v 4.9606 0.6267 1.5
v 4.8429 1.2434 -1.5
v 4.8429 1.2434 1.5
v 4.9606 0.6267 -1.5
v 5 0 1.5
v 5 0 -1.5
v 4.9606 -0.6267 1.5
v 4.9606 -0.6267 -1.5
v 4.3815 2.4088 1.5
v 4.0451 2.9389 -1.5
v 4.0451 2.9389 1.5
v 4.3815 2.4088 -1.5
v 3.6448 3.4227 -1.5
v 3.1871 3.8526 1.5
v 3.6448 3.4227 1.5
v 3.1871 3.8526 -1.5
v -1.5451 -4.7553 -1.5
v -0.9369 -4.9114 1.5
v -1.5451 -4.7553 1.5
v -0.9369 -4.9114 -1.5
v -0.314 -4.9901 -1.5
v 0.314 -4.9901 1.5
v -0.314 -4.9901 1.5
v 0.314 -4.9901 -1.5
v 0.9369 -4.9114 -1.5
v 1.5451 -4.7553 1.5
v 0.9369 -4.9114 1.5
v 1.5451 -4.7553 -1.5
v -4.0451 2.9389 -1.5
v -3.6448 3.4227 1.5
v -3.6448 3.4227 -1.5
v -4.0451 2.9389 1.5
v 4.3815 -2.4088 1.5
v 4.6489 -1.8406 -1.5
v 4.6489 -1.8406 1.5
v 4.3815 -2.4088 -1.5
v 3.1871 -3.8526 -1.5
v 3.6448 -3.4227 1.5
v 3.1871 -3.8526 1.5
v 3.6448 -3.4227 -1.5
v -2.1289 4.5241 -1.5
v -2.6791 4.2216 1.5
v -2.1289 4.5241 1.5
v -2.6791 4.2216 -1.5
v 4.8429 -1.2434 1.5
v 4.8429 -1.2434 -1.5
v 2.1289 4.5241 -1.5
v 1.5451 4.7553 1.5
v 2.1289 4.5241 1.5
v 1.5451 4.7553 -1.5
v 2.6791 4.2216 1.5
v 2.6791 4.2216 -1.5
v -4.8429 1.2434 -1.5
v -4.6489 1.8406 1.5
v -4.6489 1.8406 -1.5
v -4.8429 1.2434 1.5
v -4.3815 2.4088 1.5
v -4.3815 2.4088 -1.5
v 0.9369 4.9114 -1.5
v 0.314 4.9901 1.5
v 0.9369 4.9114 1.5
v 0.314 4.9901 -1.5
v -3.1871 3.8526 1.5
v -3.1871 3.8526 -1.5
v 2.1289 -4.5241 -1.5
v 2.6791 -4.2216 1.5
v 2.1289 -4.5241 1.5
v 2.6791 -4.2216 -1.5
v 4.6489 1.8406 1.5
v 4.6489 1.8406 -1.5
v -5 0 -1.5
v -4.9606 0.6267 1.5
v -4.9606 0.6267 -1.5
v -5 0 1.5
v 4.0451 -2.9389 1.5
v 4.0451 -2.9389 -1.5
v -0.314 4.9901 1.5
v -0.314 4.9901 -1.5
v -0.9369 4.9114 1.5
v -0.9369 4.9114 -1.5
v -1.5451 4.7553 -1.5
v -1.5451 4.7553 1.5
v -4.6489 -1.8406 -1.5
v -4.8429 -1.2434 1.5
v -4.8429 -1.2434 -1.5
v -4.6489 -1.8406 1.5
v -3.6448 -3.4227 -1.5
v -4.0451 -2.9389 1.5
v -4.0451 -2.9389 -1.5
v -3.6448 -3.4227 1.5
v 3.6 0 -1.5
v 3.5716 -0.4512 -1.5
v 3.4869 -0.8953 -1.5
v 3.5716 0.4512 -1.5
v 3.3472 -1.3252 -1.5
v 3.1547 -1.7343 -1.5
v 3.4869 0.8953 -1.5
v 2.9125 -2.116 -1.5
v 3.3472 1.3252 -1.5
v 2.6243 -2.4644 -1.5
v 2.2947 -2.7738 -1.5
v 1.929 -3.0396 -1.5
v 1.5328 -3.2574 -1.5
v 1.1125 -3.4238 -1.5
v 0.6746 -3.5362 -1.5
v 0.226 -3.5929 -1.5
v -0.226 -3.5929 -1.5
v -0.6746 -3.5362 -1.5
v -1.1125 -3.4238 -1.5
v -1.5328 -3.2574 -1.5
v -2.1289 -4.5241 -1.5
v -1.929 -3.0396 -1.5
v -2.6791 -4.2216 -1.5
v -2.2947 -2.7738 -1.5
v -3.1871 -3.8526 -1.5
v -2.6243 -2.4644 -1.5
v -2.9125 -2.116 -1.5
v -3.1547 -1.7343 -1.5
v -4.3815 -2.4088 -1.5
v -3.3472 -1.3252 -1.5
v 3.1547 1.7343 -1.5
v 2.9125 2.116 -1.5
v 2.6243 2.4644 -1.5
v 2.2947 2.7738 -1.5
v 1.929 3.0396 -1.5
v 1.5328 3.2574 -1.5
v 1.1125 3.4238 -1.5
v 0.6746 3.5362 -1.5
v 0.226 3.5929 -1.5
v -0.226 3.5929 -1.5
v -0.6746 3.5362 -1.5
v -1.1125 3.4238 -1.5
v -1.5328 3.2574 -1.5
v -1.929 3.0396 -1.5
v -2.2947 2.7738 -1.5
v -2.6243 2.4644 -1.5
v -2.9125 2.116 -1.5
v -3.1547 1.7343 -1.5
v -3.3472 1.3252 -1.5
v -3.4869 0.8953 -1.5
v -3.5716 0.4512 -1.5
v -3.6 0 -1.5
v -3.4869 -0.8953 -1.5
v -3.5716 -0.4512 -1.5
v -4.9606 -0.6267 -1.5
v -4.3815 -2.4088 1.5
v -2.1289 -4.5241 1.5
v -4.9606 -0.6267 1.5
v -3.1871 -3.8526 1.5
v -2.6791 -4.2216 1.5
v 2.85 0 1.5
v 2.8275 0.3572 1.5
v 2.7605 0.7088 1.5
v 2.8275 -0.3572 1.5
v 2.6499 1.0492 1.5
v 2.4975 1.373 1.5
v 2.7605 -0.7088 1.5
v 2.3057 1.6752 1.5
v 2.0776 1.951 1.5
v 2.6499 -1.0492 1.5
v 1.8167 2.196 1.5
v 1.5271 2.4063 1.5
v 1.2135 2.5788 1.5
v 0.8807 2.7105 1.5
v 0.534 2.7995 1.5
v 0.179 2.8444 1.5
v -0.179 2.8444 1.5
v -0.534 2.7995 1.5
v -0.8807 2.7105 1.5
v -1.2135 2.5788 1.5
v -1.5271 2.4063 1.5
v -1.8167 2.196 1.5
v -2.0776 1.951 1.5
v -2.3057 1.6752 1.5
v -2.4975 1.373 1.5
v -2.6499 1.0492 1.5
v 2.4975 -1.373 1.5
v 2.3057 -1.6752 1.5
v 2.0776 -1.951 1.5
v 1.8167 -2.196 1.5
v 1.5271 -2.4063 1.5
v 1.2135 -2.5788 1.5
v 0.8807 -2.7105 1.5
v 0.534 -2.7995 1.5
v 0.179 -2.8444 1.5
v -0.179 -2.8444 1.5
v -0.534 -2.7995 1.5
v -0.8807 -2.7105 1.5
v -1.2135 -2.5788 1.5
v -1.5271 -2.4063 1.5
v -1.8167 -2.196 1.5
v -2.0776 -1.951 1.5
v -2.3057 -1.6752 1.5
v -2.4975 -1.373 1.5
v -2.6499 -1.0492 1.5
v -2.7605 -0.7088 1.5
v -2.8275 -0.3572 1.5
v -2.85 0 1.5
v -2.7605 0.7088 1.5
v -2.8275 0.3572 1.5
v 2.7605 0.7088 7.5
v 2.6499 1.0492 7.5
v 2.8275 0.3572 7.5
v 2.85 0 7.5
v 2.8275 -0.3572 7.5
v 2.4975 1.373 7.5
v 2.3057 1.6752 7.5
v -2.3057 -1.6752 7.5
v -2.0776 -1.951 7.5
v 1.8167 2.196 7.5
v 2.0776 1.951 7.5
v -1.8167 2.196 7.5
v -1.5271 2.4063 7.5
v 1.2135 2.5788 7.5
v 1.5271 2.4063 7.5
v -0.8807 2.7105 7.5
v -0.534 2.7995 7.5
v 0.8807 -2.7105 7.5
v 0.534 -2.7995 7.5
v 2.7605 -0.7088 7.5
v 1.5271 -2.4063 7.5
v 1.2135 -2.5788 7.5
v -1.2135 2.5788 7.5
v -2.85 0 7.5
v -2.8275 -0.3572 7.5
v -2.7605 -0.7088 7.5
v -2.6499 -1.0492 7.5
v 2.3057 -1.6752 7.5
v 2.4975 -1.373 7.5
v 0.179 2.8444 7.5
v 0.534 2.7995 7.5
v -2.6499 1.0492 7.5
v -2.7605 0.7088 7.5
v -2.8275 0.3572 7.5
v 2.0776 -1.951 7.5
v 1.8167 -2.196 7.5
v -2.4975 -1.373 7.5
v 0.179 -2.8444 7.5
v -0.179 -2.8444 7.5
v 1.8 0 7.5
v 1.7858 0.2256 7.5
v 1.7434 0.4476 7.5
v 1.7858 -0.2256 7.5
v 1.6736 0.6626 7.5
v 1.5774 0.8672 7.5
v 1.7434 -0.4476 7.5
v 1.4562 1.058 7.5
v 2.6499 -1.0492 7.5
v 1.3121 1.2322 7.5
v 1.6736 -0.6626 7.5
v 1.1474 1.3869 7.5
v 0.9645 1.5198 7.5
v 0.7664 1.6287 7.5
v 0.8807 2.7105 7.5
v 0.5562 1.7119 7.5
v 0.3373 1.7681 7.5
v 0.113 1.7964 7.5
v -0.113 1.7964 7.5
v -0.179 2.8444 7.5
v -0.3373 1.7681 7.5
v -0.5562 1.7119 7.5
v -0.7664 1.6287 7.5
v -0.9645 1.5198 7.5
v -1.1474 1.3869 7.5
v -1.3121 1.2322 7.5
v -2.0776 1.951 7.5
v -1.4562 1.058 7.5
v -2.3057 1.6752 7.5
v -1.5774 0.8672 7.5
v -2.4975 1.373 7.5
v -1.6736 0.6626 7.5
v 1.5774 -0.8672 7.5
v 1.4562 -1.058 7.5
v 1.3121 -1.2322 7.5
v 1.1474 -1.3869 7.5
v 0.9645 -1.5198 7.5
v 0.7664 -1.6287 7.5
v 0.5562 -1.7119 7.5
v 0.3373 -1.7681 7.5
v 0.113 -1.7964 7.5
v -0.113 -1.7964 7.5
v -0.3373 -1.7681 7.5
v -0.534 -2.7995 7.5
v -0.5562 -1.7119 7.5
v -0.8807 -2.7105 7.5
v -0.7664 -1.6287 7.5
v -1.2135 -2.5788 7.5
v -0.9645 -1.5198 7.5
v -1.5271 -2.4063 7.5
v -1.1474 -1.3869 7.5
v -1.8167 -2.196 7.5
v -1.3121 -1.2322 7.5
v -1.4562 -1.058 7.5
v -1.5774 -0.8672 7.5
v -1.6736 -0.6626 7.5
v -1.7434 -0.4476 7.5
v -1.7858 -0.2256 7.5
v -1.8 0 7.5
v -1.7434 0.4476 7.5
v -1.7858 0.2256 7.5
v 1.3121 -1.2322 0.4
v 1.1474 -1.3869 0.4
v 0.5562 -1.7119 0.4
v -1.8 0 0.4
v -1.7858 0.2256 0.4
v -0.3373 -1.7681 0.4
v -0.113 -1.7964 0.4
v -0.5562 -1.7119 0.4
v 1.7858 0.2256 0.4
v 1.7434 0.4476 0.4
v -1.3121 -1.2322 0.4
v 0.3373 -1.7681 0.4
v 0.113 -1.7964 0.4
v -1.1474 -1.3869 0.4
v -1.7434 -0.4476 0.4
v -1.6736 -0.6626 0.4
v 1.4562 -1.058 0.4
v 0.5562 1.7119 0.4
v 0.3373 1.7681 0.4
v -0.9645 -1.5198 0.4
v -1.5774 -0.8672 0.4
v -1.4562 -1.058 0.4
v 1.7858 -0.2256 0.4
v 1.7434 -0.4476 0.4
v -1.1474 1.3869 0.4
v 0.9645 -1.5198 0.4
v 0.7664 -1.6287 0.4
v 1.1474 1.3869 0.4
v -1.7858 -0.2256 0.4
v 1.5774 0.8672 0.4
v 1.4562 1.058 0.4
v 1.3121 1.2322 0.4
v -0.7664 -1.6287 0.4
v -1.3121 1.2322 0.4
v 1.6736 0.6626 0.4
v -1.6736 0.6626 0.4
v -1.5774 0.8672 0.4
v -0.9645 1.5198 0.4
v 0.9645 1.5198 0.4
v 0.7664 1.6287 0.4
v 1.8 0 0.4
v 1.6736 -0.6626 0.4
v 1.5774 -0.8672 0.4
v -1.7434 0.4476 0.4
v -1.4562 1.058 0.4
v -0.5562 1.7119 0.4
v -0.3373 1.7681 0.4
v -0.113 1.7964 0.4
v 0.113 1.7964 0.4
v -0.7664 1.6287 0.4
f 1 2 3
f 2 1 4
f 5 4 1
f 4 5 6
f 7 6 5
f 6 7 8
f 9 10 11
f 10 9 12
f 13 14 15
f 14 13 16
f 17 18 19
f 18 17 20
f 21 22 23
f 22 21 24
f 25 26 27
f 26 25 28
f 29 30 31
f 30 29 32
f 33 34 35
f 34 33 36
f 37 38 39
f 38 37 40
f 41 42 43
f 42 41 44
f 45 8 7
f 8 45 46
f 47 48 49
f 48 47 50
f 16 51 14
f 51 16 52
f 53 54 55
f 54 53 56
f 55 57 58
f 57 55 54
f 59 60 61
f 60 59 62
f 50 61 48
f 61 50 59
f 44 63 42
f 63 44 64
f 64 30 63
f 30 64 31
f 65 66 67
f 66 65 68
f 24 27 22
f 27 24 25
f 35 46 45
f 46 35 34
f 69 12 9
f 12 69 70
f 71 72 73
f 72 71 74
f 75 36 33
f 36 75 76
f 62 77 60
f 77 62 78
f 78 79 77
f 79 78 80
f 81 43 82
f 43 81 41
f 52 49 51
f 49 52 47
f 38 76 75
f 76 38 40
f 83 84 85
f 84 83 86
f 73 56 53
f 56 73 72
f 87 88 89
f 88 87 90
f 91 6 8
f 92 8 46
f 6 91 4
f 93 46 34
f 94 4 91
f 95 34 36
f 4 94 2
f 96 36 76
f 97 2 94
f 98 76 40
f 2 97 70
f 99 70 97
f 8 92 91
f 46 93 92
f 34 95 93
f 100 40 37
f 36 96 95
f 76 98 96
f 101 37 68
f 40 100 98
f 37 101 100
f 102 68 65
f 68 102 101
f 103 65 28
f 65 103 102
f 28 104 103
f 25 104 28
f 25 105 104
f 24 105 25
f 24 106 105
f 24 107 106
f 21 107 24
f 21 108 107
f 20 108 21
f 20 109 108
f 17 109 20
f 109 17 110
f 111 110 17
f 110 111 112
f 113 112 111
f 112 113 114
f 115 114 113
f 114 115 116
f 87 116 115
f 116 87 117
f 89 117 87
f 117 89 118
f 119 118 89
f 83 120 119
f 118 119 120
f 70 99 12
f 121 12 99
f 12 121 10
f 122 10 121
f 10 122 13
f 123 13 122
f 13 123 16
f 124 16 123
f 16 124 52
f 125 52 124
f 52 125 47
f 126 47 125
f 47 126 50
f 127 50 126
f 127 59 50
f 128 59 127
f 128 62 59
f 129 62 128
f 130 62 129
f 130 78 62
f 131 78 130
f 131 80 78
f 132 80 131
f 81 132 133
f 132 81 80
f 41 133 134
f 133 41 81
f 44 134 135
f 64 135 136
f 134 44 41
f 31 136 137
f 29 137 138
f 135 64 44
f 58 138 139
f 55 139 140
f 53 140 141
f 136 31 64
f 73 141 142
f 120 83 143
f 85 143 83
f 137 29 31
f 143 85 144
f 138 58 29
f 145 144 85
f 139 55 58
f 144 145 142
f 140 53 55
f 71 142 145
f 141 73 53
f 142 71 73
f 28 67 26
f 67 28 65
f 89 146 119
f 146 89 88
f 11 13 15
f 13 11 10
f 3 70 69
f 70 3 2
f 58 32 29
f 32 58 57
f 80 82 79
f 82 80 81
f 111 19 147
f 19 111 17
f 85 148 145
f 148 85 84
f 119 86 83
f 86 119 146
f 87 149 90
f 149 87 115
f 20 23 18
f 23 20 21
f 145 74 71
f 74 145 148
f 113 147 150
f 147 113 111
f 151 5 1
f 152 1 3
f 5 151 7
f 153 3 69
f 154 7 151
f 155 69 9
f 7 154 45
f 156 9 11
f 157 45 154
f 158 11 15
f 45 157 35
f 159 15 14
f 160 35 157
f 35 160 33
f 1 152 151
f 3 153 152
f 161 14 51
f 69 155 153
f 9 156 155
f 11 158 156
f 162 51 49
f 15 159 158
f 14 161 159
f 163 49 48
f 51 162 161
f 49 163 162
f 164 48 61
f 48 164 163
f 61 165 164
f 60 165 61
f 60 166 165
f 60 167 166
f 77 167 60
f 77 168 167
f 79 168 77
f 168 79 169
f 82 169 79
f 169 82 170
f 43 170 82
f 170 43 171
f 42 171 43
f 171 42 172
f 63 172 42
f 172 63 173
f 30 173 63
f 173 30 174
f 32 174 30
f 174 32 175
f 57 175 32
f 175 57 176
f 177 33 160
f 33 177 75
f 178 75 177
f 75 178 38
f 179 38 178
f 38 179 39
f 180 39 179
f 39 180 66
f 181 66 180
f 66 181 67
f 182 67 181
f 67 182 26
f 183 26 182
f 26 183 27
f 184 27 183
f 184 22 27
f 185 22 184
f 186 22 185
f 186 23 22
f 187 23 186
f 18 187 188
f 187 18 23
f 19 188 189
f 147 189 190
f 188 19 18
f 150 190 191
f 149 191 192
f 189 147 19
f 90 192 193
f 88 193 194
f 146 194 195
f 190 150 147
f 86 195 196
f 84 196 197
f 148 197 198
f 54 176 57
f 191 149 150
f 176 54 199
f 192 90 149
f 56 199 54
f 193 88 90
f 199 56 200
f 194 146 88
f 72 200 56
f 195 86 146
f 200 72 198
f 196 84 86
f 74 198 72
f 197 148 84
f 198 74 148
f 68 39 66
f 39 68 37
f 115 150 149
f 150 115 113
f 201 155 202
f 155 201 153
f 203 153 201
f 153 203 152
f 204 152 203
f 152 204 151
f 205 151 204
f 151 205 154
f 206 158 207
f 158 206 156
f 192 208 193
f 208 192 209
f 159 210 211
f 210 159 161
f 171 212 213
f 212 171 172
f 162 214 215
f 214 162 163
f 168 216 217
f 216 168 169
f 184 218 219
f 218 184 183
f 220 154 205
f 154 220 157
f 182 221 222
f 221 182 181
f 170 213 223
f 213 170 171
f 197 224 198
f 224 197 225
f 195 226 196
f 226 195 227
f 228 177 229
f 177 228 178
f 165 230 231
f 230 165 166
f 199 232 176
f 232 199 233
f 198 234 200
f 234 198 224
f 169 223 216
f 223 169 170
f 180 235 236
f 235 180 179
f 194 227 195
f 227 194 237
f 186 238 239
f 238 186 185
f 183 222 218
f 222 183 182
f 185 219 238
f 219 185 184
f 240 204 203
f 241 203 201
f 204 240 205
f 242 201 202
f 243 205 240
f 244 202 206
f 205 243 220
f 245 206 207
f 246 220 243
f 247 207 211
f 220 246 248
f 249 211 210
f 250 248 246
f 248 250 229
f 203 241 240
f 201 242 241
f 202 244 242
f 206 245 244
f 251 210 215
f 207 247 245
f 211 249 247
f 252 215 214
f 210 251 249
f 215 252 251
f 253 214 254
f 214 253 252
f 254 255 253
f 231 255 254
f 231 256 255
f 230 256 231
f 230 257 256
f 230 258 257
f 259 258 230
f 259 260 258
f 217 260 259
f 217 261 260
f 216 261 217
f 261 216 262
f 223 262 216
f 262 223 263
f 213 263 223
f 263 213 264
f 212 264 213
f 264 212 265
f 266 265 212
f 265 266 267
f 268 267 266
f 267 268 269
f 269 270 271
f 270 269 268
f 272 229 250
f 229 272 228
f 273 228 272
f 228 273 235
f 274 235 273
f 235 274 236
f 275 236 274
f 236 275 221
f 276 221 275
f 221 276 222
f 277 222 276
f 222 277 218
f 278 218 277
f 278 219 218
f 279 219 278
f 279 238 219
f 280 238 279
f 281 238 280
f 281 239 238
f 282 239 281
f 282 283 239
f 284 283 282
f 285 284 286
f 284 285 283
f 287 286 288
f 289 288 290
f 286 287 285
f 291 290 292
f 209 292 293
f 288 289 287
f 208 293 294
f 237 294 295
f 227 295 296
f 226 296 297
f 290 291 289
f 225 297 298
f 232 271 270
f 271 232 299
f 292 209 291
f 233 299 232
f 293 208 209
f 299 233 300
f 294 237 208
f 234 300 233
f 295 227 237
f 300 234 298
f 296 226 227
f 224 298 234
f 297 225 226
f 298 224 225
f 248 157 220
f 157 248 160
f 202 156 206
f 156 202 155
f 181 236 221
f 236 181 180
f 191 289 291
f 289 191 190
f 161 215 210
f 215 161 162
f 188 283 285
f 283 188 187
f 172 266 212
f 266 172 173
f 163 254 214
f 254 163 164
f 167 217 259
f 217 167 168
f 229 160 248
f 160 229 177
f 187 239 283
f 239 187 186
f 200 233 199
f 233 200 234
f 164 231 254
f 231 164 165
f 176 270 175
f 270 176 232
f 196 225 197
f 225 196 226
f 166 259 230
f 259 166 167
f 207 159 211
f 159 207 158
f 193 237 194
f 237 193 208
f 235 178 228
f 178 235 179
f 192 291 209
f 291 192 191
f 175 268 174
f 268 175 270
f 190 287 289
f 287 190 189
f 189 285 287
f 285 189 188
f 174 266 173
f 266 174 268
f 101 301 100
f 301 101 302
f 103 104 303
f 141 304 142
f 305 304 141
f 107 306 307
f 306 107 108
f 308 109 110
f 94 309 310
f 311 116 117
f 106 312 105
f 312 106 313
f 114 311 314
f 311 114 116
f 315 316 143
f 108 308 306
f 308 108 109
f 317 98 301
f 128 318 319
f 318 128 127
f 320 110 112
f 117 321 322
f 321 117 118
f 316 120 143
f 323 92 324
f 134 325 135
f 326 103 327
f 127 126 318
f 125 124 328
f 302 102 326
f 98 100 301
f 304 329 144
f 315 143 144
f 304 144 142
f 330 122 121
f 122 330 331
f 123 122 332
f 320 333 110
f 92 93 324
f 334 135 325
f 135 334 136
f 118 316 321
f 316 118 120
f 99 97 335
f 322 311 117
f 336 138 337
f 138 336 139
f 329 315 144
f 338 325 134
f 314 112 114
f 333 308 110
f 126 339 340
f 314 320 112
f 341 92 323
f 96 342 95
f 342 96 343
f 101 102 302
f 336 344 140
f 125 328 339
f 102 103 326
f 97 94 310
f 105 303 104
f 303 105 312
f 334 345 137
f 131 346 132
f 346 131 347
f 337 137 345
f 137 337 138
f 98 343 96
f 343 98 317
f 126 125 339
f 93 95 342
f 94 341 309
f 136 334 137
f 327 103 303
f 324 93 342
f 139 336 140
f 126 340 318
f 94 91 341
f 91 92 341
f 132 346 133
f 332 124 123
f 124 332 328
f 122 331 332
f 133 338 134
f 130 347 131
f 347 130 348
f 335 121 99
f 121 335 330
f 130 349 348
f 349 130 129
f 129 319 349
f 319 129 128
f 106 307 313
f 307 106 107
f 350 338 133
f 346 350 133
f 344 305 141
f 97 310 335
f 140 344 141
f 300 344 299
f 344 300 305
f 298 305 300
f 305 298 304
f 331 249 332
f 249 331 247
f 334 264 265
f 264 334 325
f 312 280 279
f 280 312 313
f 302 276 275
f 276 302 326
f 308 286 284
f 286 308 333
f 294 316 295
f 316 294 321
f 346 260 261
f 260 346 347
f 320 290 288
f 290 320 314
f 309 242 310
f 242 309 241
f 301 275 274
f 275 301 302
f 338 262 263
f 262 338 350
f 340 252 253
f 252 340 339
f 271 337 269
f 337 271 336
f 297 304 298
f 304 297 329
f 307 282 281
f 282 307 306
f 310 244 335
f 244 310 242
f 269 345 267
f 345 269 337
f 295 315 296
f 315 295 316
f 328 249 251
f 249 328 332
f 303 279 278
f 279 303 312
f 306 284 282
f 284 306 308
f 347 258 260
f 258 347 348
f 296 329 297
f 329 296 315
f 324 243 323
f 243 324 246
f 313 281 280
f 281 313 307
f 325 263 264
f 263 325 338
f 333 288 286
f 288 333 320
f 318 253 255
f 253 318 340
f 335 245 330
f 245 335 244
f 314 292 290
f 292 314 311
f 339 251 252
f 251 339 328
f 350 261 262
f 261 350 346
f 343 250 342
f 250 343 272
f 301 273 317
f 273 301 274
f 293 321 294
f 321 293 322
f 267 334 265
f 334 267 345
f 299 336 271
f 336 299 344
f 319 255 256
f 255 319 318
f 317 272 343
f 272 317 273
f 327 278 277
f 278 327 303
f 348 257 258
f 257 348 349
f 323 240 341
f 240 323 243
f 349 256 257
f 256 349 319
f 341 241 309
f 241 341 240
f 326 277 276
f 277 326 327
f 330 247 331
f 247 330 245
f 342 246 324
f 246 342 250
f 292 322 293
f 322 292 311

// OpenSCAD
$fn = 50;


difference() {
	union() {
		translate(v = [0, 0, -1.5000000000]) {
			cylinder(h = 3, r = 5.0000000000);
		}
		translate(v = [0, 0, -1.5000000000]) {
			cylinder(h = 9, r = 2.8500000000);
		}
	}
	union() {
		translate(v = [0, 0, -1.5000000000]) {
			rotate(a = [0, 180, 0]) {
				difference() {
					union() {
						translate(v = [0, 0, -9.0000000000]) {
							cylinder(h = 9, r = 1.5000000000);
						}
						translate(v = [0, 0, -1.9000000000]) {
							cylinder(h = 1.9000000000, r1 = 1.8000000000, r2 = 3.6000000000);
						}
						translate(v = [0, 0, -9.0000000000]) {
							cylinder(h = 9, r = 1.8000000000);
						}
						translate(v = [0, 0, -9.0000000000]) {
							cylinder(h = 9, r = 1.5000000000);
						}
					}
					union();
				}
			}
		}
		translate(v = [0, 0, -50.0000000000]) {
			cylinder(h = 100, r = 1.8000000000);
		}
	}
}
